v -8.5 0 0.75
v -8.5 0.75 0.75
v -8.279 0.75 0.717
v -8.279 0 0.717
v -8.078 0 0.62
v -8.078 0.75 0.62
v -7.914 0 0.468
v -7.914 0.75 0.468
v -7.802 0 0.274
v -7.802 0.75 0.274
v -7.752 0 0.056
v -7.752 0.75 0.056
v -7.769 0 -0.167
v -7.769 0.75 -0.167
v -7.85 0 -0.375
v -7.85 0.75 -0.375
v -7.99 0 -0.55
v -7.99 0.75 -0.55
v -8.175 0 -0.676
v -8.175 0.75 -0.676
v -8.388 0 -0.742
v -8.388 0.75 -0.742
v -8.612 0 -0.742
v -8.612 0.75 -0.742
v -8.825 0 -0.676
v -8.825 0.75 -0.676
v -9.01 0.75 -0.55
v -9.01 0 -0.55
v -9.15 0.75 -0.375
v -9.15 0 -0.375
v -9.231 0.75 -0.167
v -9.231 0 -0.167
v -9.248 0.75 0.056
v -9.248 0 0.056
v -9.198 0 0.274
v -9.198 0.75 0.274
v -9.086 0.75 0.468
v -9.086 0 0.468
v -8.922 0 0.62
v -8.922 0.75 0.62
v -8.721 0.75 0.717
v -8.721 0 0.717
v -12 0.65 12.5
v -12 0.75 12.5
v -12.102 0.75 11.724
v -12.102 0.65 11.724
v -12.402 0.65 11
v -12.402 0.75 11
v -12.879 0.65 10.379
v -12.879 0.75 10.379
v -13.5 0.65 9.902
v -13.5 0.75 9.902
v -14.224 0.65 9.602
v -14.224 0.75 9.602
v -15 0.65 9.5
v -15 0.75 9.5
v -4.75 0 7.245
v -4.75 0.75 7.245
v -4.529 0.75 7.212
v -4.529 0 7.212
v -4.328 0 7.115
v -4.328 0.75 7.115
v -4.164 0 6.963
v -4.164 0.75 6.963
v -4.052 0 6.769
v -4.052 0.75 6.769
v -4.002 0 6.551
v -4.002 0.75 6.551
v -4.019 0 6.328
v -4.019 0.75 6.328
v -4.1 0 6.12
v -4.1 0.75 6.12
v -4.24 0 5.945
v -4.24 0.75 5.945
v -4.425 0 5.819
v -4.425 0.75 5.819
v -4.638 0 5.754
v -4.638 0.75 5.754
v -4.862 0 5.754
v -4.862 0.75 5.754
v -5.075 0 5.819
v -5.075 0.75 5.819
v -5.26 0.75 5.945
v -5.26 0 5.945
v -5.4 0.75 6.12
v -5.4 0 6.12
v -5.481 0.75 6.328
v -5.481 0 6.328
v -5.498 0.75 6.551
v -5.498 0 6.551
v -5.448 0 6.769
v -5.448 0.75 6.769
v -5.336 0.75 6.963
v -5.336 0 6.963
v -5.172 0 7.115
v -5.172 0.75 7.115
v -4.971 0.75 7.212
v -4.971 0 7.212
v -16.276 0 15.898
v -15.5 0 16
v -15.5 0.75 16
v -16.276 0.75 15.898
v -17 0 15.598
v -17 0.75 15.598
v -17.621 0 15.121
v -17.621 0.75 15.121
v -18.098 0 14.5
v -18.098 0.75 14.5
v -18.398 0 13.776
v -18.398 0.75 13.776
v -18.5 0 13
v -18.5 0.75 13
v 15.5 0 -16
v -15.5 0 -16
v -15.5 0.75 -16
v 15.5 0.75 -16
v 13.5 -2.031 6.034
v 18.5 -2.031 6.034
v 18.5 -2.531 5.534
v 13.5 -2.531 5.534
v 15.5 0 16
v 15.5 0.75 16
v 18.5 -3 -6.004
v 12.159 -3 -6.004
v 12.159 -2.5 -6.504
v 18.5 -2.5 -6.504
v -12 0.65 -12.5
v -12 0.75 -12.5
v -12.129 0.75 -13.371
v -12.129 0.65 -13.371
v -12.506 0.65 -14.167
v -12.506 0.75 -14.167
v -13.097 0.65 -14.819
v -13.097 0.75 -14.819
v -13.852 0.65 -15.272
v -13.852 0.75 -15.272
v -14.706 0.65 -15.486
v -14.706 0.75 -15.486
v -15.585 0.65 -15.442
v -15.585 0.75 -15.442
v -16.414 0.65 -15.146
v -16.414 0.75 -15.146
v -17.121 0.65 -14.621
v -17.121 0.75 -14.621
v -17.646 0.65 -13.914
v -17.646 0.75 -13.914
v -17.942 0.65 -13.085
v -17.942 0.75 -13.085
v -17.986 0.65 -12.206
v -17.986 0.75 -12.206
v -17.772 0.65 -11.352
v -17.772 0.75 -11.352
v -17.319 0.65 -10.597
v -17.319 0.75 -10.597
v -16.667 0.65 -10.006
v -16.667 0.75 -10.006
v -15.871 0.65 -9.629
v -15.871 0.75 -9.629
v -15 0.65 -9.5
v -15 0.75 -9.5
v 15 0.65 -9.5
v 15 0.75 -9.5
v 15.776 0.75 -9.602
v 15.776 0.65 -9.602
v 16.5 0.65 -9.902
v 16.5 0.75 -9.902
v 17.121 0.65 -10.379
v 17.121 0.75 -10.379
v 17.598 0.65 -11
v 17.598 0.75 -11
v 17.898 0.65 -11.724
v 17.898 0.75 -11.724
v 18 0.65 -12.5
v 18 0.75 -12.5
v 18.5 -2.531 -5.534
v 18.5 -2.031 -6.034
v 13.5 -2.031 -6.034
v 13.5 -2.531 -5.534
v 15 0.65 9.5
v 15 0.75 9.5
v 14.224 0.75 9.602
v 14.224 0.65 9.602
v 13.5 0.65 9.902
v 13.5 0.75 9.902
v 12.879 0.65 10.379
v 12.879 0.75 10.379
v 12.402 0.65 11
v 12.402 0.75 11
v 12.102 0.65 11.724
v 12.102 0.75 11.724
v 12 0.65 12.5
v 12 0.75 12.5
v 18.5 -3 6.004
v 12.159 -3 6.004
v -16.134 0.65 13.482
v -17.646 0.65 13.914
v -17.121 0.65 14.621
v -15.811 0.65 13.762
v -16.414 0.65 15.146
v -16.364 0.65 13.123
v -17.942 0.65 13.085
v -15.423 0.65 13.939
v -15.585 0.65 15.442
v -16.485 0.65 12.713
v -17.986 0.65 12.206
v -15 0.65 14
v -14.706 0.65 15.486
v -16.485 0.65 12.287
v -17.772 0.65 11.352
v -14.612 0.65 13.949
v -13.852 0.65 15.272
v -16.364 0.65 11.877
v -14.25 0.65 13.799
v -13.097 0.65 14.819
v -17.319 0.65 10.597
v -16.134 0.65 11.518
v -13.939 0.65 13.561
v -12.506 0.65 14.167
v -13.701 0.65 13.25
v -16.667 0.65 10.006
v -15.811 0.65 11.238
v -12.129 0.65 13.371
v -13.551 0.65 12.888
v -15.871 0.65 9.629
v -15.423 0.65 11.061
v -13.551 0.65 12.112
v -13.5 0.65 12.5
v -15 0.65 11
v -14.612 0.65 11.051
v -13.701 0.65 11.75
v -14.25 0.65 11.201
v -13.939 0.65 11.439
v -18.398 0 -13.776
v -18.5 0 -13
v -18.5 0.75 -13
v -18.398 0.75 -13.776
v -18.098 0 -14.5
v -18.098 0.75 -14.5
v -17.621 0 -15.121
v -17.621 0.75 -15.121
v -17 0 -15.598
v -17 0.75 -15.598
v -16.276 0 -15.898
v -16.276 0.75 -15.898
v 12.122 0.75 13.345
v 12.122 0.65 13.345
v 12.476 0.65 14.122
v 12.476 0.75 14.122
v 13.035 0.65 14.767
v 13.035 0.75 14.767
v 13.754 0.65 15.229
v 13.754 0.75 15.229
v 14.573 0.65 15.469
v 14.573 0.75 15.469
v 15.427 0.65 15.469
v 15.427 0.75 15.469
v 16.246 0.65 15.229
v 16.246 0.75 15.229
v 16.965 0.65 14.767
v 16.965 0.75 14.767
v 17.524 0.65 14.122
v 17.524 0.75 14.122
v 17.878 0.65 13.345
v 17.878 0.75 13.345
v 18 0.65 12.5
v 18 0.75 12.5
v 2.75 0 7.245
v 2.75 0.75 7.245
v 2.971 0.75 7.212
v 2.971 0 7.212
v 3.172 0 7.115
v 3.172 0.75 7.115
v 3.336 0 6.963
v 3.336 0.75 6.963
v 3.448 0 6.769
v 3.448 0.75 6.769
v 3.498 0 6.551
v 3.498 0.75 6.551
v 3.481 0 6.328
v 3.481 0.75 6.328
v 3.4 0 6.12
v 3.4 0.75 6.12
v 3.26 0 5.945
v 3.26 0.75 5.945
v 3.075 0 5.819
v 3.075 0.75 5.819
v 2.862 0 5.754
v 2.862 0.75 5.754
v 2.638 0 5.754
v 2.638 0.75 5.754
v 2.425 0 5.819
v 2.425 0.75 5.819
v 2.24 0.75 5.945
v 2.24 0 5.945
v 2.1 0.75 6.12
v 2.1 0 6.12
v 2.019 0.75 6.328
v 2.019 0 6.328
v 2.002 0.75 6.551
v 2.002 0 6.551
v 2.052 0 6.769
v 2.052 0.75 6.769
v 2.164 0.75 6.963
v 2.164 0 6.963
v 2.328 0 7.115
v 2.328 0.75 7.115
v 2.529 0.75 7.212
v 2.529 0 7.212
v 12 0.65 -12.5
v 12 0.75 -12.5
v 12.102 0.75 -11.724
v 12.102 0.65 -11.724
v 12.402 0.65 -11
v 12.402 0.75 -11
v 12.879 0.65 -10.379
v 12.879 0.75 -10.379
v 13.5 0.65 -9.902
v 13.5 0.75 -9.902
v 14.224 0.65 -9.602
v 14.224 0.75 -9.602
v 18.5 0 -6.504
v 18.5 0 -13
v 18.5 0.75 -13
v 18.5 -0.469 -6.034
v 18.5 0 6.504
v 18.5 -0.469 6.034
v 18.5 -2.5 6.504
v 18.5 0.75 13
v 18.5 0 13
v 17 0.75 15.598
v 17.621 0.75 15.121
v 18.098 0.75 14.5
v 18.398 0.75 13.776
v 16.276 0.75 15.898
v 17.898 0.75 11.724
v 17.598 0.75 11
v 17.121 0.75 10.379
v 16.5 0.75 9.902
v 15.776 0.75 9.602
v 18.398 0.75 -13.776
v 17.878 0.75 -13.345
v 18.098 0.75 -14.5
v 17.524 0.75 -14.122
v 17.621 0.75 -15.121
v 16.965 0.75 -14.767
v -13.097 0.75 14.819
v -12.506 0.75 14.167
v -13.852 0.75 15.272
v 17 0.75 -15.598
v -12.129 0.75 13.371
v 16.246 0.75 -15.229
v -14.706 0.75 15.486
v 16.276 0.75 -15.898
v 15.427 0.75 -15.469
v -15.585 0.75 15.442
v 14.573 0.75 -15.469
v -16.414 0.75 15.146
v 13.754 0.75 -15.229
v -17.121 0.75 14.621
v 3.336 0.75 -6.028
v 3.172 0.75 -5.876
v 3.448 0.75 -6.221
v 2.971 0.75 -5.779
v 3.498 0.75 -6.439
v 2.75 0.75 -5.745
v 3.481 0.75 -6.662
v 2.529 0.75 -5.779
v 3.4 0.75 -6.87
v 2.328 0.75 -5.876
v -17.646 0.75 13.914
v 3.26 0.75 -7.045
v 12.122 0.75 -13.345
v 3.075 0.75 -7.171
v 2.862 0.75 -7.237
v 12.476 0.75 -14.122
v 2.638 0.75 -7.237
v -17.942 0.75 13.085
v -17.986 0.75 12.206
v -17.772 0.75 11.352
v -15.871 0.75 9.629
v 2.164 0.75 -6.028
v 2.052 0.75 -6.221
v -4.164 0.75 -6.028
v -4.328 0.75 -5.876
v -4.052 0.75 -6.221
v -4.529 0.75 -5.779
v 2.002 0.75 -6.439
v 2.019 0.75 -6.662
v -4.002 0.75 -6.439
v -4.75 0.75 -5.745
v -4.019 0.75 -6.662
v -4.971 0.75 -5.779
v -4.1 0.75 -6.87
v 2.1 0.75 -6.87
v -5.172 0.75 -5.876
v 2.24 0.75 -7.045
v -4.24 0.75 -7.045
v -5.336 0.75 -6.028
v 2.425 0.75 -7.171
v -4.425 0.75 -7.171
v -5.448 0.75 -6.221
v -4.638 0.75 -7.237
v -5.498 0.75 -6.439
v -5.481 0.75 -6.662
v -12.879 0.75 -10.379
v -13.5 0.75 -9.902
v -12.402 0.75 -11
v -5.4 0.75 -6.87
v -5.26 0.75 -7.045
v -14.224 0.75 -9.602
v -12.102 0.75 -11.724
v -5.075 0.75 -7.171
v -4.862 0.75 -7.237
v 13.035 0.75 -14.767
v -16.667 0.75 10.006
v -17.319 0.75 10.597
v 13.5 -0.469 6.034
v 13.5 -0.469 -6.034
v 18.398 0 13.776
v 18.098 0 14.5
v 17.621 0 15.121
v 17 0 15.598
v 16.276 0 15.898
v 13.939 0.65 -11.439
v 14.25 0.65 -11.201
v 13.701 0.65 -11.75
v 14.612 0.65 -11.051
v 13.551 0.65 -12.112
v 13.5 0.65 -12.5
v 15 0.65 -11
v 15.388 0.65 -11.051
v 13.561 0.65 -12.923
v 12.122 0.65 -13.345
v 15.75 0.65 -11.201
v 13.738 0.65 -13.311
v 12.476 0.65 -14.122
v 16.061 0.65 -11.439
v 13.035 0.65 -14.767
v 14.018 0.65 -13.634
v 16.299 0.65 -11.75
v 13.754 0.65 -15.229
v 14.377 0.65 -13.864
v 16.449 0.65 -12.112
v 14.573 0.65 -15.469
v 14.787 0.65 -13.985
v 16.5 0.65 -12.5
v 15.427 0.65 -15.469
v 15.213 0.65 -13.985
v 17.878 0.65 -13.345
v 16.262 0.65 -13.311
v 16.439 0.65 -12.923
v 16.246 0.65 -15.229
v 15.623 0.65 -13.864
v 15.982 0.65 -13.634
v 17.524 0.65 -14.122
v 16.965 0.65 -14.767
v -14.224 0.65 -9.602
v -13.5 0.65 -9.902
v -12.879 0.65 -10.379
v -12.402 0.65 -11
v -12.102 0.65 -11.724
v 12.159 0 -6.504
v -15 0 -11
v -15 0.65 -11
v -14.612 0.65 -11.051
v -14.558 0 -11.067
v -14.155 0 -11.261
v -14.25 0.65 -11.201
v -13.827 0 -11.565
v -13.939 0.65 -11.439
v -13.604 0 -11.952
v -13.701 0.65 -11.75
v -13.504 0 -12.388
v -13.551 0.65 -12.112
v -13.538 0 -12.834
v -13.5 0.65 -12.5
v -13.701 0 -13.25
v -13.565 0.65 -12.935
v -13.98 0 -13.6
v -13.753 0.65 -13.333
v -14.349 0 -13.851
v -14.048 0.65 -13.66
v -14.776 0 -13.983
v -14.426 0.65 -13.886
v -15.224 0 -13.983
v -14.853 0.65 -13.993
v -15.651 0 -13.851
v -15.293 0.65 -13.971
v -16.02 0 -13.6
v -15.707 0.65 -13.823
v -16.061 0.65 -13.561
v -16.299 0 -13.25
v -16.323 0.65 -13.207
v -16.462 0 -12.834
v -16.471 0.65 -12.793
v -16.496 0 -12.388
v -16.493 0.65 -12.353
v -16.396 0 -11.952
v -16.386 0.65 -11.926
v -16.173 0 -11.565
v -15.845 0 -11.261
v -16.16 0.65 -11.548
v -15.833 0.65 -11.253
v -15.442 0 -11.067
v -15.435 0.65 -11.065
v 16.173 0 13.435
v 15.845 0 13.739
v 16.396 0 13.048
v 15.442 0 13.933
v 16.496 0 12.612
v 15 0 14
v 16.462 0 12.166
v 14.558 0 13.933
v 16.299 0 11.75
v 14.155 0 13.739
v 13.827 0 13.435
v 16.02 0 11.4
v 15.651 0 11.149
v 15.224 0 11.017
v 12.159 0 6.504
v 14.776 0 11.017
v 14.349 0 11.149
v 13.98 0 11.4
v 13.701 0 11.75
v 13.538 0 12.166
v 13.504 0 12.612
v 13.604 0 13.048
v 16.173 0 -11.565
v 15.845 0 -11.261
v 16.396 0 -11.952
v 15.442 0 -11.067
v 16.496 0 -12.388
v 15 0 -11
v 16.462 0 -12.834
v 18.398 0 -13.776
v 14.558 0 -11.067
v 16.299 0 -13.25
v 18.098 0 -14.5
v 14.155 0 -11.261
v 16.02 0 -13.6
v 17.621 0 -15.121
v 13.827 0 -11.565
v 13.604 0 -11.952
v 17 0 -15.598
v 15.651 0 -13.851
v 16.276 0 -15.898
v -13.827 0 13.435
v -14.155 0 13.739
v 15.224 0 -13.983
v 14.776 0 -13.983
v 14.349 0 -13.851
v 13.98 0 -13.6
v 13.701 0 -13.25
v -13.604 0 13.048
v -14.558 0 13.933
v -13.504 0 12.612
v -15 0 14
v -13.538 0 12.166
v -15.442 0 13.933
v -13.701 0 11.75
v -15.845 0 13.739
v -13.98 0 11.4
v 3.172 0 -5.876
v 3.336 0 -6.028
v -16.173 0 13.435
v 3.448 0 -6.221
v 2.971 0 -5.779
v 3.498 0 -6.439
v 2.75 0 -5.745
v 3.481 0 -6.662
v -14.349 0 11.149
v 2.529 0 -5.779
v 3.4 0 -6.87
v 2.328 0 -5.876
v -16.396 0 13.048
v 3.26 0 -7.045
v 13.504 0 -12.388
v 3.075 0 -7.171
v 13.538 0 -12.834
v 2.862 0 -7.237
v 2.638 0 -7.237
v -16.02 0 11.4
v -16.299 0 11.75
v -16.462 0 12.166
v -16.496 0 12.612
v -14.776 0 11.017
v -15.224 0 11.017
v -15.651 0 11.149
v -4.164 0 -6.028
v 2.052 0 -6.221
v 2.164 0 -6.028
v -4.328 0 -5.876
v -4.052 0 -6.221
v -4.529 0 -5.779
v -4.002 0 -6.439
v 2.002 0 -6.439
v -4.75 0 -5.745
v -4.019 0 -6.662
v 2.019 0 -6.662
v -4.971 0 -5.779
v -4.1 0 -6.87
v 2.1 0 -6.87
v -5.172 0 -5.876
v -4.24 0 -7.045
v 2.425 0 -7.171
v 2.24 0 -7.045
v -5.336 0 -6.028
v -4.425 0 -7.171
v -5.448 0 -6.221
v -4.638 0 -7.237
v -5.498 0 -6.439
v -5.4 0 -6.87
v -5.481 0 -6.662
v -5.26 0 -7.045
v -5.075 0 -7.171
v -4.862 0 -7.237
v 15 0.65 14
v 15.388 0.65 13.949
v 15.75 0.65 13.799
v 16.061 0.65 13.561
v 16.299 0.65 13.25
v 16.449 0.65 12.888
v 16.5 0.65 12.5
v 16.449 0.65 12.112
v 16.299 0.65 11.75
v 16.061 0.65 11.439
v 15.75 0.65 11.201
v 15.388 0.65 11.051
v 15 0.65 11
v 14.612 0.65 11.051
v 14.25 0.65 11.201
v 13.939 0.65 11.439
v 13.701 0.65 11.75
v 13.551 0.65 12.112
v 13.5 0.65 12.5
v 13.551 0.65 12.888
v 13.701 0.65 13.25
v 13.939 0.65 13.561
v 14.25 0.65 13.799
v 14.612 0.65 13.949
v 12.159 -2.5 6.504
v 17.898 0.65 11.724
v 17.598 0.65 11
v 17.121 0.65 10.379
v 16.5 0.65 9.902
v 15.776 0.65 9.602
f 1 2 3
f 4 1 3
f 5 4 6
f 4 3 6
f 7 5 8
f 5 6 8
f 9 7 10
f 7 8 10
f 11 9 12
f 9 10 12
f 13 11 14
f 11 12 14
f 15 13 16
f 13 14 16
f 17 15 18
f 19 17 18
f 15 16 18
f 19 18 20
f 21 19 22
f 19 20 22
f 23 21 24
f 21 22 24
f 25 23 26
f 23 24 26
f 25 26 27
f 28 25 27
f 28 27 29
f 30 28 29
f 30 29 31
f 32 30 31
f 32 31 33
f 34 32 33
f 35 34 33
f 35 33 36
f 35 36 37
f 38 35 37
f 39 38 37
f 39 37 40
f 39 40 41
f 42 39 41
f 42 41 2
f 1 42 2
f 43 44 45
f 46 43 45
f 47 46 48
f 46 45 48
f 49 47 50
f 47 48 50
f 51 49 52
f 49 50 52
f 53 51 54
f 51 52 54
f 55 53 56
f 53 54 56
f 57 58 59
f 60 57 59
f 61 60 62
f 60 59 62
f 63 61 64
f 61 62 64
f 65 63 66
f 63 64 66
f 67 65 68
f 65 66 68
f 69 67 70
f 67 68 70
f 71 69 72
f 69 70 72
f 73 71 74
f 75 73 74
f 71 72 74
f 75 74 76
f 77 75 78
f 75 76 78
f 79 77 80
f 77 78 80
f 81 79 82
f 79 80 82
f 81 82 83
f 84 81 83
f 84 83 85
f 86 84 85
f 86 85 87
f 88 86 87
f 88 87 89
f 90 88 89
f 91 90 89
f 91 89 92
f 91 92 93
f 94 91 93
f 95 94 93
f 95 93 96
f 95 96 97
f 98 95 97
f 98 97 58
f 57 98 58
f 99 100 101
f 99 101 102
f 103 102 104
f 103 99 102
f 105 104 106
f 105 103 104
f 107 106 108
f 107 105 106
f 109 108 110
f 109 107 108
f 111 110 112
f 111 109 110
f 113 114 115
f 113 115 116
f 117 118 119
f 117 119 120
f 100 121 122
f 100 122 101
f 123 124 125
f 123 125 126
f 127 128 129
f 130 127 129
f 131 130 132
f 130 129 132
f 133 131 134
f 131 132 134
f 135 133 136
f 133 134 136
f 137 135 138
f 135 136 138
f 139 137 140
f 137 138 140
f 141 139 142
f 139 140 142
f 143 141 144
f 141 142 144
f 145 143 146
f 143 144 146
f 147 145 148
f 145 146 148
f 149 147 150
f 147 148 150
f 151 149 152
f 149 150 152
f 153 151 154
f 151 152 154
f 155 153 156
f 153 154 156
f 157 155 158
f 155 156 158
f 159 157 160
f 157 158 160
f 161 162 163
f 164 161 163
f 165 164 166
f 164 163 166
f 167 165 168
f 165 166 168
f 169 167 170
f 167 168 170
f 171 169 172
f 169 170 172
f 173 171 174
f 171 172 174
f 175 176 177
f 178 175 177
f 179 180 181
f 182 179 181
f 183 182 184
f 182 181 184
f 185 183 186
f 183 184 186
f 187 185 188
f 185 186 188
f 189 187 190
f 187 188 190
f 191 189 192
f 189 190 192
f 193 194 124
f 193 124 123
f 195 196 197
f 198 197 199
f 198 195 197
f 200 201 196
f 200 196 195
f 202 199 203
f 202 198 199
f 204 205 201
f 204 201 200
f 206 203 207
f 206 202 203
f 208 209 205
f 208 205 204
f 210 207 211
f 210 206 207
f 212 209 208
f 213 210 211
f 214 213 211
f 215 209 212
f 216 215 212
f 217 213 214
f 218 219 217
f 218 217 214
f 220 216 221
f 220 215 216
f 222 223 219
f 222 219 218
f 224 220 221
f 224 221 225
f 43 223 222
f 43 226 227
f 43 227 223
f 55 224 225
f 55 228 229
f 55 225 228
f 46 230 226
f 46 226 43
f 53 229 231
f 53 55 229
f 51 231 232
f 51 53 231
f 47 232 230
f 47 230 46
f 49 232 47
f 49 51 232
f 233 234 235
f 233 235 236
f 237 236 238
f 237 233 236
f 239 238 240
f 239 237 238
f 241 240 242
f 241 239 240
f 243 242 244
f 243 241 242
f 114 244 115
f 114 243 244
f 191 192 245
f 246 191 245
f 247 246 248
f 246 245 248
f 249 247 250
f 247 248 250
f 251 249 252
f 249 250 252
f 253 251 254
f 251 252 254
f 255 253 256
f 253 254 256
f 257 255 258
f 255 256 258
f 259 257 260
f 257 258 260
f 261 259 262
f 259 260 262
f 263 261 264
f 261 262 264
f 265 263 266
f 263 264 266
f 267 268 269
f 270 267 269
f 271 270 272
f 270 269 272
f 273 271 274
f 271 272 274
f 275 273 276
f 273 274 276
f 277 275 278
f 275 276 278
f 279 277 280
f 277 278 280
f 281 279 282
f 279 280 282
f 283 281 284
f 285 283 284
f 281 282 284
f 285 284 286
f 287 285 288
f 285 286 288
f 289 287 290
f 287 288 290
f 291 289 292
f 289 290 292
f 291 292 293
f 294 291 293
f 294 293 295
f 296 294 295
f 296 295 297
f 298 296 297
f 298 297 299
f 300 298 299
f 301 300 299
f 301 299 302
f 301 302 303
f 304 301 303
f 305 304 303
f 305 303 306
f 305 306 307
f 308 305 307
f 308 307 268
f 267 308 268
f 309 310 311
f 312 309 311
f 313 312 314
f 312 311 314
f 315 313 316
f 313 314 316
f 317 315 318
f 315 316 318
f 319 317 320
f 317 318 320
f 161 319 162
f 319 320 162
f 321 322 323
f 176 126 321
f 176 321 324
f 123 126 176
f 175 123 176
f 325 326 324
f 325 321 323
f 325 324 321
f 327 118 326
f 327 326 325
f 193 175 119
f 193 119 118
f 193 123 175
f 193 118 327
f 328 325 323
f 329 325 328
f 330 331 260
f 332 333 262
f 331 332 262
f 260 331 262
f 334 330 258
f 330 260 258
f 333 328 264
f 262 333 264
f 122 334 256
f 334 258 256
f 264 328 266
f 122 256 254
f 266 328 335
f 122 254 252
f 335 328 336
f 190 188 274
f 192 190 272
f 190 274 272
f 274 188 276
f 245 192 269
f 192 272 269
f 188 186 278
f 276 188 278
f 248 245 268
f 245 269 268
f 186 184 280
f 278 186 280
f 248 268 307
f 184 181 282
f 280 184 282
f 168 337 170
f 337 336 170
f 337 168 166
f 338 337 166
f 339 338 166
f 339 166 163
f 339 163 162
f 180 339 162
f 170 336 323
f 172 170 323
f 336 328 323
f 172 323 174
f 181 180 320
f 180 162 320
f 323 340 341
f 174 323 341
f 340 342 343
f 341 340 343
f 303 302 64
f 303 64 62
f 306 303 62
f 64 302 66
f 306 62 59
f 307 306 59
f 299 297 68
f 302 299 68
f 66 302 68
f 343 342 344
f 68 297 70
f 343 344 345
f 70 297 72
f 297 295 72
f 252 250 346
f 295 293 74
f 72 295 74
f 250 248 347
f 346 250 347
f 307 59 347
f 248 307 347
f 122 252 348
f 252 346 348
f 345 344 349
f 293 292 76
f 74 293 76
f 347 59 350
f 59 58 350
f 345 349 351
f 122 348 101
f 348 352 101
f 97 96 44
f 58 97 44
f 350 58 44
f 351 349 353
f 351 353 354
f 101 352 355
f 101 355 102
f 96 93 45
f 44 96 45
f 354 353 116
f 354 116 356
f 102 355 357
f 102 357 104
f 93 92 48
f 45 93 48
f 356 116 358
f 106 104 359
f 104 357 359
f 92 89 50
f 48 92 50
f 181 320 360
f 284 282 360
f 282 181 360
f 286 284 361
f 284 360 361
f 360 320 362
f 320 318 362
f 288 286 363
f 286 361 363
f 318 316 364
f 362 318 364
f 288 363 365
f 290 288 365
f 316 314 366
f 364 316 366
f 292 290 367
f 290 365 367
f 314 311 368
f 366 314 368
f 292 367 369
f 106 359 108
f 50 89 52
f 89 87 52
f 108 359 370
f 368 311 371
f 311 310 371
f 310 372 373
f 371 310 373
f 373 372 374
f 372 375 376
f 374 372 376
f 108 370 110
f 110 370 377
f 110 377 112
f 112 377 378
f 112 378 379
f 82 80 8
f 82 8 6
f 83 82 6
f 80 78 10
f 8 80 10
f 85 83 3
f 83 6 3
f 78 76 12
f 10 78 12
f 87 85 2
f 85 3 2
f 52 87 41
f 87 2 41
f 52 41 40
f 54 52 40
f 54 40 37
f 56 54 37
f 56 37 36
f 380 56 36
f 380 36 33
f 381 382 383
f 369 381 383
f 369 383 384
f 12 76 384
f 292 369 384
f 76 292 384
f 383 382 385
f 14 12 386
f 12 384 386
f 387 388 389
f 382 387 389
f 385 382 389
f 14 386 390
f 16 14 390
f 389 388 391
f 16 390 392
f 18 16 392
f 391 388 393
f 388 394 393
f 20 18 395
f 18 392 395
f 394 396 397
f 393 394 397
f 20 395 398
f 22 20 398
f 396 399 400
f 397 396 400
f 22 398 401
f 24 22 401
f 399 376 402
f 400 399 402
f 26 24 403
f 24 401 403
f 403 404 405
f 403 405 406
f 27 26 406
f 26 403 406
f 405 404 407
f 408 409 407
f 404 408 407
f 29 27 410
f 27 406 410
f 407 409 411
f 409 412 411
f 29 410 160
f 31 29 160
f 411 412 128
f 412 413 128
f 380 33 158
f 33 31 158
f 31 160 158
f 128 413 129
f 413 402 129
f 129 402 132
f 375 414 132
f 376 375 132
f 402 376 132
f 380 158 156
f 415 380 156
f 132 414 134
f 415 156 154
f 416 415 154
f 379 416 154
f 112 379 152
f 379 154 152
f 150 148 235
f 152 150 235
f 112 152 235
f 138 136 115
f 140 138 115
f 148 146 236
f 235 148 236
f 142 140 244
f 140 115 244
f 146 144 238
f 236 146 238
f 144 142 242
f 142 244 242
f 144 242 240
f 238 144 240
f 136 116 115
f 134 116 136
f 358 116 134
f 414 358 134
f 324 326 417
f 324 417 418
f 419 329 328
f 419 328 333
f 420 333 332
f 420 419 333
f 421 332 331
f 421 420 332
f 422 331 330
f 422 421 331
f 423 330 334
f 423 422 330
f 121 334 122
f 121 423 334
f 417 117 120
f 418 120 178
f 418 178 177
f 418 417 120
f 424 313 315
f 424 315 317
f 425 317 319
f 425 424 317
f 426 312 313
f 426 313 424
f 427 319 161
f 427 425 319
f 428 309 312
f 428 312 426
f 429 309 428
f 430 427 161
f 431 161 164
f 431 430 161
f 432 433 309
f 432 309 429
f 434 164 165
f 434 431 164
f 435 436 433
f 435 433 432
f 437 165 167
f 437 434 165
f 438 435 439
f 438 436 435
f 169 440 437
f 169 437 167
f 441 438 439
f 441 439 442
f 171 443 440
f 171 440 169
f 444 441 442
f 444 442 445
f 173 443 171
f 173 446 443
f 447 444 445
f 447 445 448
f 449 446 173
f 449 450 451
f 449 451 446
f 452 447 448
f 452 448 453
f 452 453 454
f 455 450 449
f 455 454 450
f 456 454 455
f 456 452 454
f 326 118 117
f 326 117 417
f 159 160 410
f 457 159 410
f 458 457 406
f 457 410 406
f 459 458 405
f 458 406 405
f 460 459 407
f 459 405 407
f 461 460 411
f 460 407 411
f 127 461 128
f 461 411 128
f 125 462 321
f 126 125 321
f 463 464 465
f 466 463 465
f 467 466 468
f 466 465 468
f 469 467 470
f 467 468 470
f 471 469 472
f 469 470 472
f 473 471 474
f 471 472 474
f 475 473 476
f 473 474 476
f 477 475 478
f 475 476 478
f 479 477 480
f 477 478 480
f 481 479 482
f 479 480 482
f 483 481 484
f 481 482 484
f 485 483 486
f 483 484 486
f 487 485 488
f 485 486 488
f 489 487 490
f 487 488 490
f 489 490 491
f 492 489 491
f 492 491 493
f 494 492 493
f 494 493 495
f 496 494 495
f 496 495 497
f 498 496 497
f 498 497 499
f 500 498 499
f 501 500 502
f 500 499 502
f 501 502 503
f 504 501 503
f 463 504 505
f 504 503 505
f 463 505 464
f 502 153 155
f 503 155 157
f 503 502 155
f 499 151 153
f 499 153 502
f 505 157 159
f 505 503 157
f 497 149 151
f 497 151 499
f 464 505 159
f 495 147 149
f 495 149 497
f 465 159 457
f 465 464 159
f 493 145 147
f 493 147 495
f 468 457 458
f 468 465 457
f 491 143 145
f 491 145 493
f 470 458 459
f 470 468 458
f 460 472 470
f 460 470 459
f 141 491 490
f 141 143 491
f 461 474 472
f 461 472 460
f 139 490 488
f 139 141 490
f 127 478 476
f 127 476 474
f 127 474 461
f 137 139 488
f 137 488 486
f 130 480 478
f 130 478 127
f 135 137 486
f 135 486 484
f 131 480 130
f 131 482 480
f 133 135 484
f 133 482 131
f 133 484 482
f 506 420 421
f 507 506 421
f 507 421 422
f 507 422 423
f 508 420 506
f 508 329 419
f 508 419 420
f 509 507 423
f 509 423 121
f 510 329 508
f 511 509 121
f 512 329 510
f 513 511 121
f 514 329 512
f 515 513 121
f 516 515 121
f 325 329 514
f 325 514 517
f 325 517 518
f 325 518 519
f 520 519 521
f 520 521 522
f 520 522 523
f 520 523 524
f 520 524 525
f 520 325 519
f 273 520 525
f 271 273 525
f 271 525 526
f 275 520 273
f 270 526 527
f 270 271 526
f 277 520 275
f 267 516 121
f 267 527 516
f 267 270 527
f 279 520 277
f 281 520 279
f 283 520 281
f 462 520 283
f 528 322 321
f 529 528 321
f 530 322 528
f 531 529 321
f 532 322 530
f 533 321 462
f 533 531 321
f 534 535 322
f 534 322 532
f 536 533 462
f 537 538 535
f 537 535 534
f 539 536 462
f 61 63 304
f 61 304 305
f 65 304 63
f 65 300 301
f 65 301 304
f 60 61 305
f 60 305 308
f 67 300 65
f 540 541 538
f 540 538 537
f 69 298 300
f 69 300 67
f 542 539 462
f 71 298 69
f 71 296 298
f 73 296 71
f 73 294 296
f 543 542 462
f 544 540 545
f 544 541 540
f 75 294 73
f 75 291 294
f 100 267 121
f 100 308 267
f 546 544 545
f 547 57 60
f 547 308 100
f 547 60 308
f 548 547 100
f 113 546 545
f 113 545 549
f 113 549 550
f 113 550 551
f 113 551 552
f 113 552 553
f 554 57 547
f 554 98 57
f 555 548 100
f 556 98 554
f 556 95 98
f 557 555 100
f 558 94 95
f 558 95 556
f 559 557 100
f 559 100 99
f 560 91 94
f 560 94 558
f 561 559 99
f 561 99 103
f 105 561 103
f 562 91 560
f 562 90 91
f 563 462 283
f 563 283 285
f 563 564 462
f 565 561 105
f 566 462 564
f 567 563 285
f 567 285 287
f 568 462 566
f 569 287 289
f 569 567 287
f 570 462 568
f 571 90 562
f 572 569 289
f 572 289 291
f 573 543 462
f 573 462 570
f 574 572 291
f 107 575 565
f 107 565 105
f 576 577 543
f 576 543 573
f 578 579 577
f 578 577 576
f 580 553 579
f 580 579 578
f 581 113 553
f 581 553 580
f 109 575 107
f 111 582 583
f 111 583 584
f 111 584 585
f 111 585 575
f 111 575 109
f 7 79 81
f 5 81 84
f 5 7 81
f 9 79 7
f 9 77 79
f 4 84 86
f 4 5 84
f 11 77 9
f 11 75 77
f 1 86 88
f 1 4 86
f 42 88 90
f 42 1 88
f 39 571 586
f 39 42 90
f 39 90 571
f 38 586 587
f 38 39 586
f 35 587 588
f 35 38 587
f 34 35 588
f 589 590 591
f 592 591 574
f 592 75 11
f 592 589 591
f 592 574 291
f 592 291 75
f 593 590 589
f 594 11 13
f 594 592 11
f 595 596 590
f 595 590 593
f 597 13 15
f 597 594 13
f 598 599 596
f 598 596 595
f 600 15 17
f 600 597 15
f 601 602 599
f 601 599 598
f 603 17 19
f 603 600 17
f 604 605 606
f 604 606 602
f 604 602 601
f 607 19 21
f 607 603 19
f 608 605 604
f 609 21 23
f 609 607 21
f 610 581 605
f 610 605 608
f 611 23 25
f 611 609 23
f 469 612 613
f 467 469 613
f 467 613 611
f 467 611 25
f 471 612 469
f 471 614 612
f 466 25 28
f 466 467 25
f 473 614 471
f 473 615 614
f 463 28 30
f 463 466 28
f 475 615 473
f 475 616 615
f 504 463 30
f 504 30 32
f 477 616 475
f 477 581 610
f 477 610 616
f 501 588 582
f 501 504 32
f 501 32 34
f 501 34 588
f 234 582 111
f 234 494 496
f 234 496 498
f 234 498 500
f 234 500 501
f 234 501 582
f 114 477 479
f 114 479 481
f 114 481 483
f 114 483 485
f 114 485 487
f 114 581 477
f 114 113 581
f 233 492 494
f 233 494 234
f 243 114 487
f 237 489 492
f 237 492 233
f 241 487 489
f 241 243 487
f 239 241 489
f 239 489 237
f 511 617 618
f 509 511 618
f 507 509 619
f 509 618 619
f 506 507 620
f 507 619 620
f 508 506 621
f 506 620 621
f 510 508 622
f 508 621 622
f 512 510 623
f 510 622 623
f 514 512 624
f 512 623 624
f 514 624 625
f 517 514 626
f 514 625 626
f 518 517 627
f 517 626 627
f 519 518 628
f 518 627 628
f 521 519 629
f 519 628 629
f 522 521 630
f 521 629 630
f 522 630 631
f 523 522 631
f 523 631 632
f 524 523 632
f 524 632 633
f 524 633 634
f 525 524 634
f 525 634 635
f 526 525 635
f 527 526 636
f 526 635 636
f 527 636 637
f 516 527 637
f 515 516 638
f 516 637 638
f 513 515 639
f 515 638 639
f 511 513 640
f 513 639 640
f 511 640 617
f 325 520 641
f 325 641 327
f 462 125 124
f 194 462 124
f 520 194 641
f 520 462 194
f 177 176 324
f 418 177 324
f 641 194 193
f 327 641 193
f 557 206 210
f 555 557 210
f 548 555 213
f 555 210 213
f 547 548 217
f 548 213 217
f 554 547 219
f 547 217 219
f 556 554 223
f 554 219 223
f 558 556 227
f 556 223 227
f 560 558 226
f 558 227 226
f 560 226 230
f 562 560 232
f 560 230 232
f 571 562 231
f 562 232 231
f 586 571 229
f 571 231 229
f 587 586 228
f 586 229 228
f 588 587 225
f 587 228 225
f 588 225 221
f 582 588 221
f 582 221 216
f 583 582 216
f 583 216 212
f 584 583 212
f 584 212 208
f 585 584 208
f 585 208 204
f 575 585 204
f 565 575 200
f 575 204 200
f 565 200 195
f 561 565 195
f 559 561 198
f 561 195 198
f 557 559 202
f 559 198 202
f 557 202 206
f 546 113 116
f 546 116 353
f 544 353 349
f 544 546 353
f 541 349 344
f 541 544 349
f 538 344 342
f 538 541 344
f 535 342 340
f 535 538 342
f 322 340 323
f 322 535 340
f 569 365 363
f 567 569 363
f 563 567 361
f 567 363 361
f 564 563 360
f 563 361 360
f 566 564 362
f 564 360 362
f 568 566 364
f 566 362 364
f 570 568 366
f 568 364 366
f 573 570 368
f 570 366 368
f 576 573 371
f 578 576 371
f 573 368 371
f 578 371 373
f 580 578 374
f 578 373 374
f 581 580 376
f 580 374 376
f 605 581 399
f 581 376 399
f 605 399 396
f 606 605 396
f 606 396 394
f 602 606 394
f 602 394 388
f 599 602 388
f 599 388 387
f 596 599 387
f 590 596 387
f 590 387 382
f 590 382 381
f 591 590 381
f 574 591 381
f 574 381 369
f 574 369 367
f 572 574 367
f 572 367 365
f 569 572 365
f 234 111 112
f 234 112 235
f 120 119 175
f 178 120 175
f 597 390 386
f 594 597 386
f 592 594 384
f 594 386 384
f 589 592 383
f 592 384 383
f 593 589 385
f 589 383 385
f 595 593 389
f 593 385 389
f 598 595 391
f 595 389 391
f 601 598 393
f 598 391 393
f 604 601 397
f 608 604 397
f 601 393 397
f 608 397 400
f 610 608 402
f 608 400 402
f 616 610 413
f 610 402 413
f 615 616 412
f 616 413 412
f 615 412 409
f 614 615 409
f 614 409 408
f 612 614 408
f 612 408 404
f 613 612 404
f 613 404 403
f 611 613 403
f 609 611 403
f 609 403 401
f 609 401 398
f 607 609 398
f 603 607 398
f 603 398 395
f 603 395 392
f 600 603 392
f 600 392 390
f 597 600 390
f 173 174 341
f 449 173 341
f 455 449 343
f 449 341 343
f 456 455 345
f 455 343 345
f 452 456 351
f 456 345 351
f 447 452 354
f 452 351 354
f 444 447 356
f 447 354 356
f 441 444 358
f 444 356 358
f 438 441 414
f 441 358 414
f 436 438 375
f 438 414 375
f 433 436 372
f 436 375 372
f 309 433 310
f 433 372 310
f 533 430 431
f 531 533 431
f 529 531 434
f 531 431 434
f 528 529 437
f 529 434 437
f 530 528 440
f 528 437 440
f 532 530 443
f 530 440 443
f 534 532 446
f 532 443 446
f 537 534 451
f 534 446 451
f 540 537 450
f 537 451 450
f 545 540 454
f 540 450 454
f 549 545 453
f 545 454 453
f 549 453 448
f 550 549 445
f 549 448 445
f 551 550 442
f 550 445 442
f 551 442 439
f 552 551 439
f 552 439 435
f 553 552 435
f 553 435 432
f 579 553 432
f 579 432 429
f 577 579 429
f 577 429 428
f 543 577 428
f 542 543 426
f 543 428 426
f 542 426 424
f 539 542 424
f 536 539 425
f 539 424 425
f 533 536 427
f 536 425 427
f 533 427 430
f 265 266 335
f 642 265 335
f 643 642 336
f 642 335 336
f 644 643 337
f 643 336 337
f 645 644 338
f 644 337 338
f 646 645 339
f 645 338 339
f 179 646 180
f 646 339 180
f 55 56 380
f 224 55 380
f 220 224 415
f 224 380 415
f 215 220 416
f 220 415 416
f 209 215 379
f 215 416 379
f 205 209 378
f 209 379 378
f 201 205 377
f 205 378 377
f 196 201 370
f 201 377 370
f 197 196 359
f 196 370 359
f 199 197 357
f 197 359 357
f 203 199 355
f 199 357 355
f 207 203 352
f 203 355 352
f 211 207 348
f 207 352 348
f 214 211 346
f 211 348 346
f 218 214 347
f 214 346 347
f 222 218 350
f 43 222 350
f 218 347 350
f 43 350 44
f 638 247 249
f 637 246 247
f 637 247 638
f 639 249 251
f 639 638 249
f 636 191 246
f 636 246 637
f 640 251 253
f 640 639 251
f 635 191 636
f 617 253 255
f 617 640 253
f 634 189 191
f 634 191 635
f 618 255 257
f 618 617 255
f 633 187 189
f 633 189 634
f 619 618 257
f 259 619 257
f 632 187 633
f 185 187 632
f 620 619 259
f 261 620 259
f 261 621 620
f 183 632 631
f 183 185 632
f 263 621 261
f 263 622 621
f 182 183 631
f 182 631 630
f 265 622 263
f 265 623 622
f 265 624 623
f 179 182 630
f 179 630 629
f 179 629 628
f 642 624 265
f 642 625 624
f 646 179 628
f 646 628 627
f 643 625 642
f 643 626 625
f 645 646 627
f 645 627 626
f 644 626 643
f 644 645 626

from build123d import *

# Parameters (mm, degrees)
BOSS_EXTRUDE1_DEPTH = 0.75
CUT_EXTRUDE3_DEPTH  = 0.1
SKETCH3_R           = 1.5
CUT_EXTRUDE4_DEPTH  = 3.1
SKETCH4_R           = 0.75
CUT_EXTRUDE5_DEPTH  = 10
SKETCH6_W           = 6.340818297
SKETCH6_H           = 13.007496706
BOSS_EXTRUDE2_DEPTH = 3
SKETCH7_W           = 12.068220188
SKETCH7_H           = 2.061032276
CUT_EXTRUDE6_DEPTH  = 5
CHAMFER2_SIZE       = 0.5


with BuildPart() as part:
    # Sketch1 → Boss-Extrude1 (new body)
    with BuildSketch(Plane(origin=(0, 0, 0), x_dir=(1, 0, 0), z_dir=(0, 1, 0))):
        with BuildLine():
            Line((-15.5, 16), (15.5, 16))
            ThreePointArc((15.5, 16), (17.621320344, 15.121320344), (18.5, 13))
            Line((18.5, 13), (18.5, -13))
            ThreePointArc((18.5, -13), (17.621320344, -15.121320344), (15.5, -16))
            Line((15.5, -16), (-15.5, -16))
            ThreePointArc((-15.5, -16), (-17.621320344, -15.121320344), (-18.5, -13))
            Line((-18.5, -13), (-18.5, 13))
            ThreePointArc((-18.5, 13), (-17.621320344, 15.121320344), (-15.5, 16))
        make_face()
    extrude(amount=BOSS_EXTRUDE1_DEPTH)

    # Sketch2 → Cut-Extrude3 (cut)
    with BuildSketch(Plane(origin=(0, 0.75, 0), x_dir=(1, 0, 0), z_dir=(0, 1, 0))):
        with BuildLine():
            ThreePointArc((-15, 11), (-16.060660172, 13.560660172), (-13.5, 12.5))
            Line((-13.5, 12.5), (-12, 12.5))
            ThreePointArc((-12, 12.5), (-17.121320344, 14.621320344), (-15, 9.5))
            Line((-15, 9.5), (-15, 11))
        make_face()
        with BuildLine():
            Line((-12, 12.5), (-13.5, 12.5))
            ThreePointArc((-13.5, 12.5), (-13.939339828, 11.439339828), (-15, 11))
            Line((-15, 11), (-15, 9.5))
            ThreePointArc((-15, 9.5), (-12.878679656, 10.378679656), (-12, 12.5))
        make_face()
        with BuildLine():
            ThreePointArc((18, 12.5), (15, 15.5), (12, 12.5))
            Line((12, 12.5), (13.5, 12.5))
            ThreePointArc((13.5, 12.5), (15, 14), (16.5, 12.5))
            ThreePointArc((16.5, 12.5), (16.060660172, 11.439339828), (15, 11))
            Line((15, 11), (15, 9.5))
            ThreePointArc((15, 9.5), (17.121320344, 10.378679656), (18, 12.5))
        make_face()
        with BuildLine():
            Line((13.5, 12.5), (12, 12.5))
            ThreePointArc((12, 12.5), (12.878679656, 10.378679656), (15, 9.5))
            Line((15, 9.5), (15, 11))
            ThreePointArc((15, 11), (13.939339828, 11.439339828), (13.5, 12.5))
        make_face()
        with BuildLine():
            ThreePointArc((18, -12.5), (17.121320344, -10.378679656), (15, -9.5))
            Line((15, -9.5), (15, -11))
            ThreePointArc((15, -11), (16.060660172, -11.439339828), (16.5, -12.5))
            ThreePointArc((16.5, -12.5), (15, -14), (13.5, -12.5))
            Line((13.5, -12.5), (12, -12.5))
            ThreePointArc((12, -12.5), (15, -15.5), (18, -12.5))
        make_face()
        with BuildLine():
            Line((15, -11), (15, -9.5))
            ThreePointArc((15, -9.5), (12.878679656, -10.378679656), (12, -12.5))
            Line((12, -12.5), (13.5, -12.5))
            ThreePointArc((13.5, -12.5), (13.939339828, -11.439339828), (15, -11))
        make_face()
        with BuildLine():
            ThreePointArc((-12, -12.5), (-12.878679656, -10.378679656), (-15, -9.5))
            Line((-15, -9.5), (-15, -11))
            ThreePointArc((-15, -11), (-13.939339828, -11.439339828), (-13.5, -12.5))
            Line((-13.5, -12.5), (-12, -12.5))
        make_face()
        with BuildLine():
            Line((-15, -11), (-15, -9.5))
            ThreePointArc((-15, -9.5), (-17.121320344, -14.621320344), (-12, -12.5))
            Line((-12, -12.5), (-13.5, -12.5))
            ThreePointArc((-13.5, -12.5), (-16.060660172, -13.560660172), (-15, -11))
        make_face()
    extrude(amount=-CUT_EXTRUDE3_DEPTH, mode=Mode.SUBTRACT)

    # Sketch3 → Cut-Extrude4 (cut)
    with BuildSketch(Plane(origin=(0, 0.75, 0), x_dir=(1, 0, 0), z_dir=(0, 1, 0))):
        with Locations(Location((-15, 12.5, 0), (0, 0, 270))):
            Circle(SKETCH3_R)
        with Locations(Location((15, 12.5, 0), (0, 0, 270))):
            Circle(SKETCH3_R)
        with Locations(Location((-15, -12.5, 0), (0, 0, 270))):
            Circle(SKETCH3_R)
        with Locations(Location((15, -12.5, 0), (0, 0, 270))):
            Circle(SKETCH3_R)
    extrude(amount=-CUT_EXTRUDE4_DEPTH, mode=Mode.SUBTRACT)

    # Sketch4 → Cut-Extrude5 (cut)
    with BuildSketch(Plane(origin=(0, 0.75, 0), x_dir=(1, 0, 0), z_dir=(0, 1, 0))):
        with Locations(Location((2.75, -6.495190528, 0), (0, 0, 270))):
            Circle(SKETCH4_R)
        with Locations(Location((-4.75, -6.495190528, 0), (0, 0, 270))):
            Circle(SKETCH4_R)
        with Locations(Location((-8.5, 0, 0), (0, 0, 270))):
            Circle(SKETCH4_R)
        with Locations(Location((-4.75, 6.495190528, 0), (0, 0, 270))):
            Circle(SKETCH4_R)
        with Locations(Location((2.75, 6.495190528, 0), (0, 0, 270))):
            Circle(SKETCH4_R)
    extrude(amount=-CUT_EXTRUDE5_DEPTH, mode=Mode.SUBTRACT)

    # Sketch6 → Boss-Extrude2 (add)
    with BuildSketch(Plane.XZ):
        with Locations((15.329590852, 0)):
            Rectangle(SKETCH6_W, SKETCH6_H)
    extrude(amount=BOSS_EXTRUDE2_DEPTH)

    # Sketch7 → Cut-Extrude6 (cut)
    with BuildSketch(Plane(origin=(18.5, 0, 0), x_dir=(0, 0, -1), z_dir=(1, 0, 0))):
        with Locations((0, -1.5)):
            Rectangle(SKETCH7_W, SKETCH7_H)
    extrude(amount=-CUT_EXTRUDE6_DEPTH, mode=Mode.SUBTRACT)

    # Chamfer2
    chamfer2_edges = [part.edges().sort_by_distance(p)[0] for p in [
        (15.329590852, -3, -6.503748353),
        (15.329590852, -3, 6.503748353),
        (16, -2.530516138, 6.034110094),
        (16, -2.530516138, -6.034110094),
    ]]
    chamfer(chamfer2_edges, length=CHAMFER2_SIZE)


solid = part.part
